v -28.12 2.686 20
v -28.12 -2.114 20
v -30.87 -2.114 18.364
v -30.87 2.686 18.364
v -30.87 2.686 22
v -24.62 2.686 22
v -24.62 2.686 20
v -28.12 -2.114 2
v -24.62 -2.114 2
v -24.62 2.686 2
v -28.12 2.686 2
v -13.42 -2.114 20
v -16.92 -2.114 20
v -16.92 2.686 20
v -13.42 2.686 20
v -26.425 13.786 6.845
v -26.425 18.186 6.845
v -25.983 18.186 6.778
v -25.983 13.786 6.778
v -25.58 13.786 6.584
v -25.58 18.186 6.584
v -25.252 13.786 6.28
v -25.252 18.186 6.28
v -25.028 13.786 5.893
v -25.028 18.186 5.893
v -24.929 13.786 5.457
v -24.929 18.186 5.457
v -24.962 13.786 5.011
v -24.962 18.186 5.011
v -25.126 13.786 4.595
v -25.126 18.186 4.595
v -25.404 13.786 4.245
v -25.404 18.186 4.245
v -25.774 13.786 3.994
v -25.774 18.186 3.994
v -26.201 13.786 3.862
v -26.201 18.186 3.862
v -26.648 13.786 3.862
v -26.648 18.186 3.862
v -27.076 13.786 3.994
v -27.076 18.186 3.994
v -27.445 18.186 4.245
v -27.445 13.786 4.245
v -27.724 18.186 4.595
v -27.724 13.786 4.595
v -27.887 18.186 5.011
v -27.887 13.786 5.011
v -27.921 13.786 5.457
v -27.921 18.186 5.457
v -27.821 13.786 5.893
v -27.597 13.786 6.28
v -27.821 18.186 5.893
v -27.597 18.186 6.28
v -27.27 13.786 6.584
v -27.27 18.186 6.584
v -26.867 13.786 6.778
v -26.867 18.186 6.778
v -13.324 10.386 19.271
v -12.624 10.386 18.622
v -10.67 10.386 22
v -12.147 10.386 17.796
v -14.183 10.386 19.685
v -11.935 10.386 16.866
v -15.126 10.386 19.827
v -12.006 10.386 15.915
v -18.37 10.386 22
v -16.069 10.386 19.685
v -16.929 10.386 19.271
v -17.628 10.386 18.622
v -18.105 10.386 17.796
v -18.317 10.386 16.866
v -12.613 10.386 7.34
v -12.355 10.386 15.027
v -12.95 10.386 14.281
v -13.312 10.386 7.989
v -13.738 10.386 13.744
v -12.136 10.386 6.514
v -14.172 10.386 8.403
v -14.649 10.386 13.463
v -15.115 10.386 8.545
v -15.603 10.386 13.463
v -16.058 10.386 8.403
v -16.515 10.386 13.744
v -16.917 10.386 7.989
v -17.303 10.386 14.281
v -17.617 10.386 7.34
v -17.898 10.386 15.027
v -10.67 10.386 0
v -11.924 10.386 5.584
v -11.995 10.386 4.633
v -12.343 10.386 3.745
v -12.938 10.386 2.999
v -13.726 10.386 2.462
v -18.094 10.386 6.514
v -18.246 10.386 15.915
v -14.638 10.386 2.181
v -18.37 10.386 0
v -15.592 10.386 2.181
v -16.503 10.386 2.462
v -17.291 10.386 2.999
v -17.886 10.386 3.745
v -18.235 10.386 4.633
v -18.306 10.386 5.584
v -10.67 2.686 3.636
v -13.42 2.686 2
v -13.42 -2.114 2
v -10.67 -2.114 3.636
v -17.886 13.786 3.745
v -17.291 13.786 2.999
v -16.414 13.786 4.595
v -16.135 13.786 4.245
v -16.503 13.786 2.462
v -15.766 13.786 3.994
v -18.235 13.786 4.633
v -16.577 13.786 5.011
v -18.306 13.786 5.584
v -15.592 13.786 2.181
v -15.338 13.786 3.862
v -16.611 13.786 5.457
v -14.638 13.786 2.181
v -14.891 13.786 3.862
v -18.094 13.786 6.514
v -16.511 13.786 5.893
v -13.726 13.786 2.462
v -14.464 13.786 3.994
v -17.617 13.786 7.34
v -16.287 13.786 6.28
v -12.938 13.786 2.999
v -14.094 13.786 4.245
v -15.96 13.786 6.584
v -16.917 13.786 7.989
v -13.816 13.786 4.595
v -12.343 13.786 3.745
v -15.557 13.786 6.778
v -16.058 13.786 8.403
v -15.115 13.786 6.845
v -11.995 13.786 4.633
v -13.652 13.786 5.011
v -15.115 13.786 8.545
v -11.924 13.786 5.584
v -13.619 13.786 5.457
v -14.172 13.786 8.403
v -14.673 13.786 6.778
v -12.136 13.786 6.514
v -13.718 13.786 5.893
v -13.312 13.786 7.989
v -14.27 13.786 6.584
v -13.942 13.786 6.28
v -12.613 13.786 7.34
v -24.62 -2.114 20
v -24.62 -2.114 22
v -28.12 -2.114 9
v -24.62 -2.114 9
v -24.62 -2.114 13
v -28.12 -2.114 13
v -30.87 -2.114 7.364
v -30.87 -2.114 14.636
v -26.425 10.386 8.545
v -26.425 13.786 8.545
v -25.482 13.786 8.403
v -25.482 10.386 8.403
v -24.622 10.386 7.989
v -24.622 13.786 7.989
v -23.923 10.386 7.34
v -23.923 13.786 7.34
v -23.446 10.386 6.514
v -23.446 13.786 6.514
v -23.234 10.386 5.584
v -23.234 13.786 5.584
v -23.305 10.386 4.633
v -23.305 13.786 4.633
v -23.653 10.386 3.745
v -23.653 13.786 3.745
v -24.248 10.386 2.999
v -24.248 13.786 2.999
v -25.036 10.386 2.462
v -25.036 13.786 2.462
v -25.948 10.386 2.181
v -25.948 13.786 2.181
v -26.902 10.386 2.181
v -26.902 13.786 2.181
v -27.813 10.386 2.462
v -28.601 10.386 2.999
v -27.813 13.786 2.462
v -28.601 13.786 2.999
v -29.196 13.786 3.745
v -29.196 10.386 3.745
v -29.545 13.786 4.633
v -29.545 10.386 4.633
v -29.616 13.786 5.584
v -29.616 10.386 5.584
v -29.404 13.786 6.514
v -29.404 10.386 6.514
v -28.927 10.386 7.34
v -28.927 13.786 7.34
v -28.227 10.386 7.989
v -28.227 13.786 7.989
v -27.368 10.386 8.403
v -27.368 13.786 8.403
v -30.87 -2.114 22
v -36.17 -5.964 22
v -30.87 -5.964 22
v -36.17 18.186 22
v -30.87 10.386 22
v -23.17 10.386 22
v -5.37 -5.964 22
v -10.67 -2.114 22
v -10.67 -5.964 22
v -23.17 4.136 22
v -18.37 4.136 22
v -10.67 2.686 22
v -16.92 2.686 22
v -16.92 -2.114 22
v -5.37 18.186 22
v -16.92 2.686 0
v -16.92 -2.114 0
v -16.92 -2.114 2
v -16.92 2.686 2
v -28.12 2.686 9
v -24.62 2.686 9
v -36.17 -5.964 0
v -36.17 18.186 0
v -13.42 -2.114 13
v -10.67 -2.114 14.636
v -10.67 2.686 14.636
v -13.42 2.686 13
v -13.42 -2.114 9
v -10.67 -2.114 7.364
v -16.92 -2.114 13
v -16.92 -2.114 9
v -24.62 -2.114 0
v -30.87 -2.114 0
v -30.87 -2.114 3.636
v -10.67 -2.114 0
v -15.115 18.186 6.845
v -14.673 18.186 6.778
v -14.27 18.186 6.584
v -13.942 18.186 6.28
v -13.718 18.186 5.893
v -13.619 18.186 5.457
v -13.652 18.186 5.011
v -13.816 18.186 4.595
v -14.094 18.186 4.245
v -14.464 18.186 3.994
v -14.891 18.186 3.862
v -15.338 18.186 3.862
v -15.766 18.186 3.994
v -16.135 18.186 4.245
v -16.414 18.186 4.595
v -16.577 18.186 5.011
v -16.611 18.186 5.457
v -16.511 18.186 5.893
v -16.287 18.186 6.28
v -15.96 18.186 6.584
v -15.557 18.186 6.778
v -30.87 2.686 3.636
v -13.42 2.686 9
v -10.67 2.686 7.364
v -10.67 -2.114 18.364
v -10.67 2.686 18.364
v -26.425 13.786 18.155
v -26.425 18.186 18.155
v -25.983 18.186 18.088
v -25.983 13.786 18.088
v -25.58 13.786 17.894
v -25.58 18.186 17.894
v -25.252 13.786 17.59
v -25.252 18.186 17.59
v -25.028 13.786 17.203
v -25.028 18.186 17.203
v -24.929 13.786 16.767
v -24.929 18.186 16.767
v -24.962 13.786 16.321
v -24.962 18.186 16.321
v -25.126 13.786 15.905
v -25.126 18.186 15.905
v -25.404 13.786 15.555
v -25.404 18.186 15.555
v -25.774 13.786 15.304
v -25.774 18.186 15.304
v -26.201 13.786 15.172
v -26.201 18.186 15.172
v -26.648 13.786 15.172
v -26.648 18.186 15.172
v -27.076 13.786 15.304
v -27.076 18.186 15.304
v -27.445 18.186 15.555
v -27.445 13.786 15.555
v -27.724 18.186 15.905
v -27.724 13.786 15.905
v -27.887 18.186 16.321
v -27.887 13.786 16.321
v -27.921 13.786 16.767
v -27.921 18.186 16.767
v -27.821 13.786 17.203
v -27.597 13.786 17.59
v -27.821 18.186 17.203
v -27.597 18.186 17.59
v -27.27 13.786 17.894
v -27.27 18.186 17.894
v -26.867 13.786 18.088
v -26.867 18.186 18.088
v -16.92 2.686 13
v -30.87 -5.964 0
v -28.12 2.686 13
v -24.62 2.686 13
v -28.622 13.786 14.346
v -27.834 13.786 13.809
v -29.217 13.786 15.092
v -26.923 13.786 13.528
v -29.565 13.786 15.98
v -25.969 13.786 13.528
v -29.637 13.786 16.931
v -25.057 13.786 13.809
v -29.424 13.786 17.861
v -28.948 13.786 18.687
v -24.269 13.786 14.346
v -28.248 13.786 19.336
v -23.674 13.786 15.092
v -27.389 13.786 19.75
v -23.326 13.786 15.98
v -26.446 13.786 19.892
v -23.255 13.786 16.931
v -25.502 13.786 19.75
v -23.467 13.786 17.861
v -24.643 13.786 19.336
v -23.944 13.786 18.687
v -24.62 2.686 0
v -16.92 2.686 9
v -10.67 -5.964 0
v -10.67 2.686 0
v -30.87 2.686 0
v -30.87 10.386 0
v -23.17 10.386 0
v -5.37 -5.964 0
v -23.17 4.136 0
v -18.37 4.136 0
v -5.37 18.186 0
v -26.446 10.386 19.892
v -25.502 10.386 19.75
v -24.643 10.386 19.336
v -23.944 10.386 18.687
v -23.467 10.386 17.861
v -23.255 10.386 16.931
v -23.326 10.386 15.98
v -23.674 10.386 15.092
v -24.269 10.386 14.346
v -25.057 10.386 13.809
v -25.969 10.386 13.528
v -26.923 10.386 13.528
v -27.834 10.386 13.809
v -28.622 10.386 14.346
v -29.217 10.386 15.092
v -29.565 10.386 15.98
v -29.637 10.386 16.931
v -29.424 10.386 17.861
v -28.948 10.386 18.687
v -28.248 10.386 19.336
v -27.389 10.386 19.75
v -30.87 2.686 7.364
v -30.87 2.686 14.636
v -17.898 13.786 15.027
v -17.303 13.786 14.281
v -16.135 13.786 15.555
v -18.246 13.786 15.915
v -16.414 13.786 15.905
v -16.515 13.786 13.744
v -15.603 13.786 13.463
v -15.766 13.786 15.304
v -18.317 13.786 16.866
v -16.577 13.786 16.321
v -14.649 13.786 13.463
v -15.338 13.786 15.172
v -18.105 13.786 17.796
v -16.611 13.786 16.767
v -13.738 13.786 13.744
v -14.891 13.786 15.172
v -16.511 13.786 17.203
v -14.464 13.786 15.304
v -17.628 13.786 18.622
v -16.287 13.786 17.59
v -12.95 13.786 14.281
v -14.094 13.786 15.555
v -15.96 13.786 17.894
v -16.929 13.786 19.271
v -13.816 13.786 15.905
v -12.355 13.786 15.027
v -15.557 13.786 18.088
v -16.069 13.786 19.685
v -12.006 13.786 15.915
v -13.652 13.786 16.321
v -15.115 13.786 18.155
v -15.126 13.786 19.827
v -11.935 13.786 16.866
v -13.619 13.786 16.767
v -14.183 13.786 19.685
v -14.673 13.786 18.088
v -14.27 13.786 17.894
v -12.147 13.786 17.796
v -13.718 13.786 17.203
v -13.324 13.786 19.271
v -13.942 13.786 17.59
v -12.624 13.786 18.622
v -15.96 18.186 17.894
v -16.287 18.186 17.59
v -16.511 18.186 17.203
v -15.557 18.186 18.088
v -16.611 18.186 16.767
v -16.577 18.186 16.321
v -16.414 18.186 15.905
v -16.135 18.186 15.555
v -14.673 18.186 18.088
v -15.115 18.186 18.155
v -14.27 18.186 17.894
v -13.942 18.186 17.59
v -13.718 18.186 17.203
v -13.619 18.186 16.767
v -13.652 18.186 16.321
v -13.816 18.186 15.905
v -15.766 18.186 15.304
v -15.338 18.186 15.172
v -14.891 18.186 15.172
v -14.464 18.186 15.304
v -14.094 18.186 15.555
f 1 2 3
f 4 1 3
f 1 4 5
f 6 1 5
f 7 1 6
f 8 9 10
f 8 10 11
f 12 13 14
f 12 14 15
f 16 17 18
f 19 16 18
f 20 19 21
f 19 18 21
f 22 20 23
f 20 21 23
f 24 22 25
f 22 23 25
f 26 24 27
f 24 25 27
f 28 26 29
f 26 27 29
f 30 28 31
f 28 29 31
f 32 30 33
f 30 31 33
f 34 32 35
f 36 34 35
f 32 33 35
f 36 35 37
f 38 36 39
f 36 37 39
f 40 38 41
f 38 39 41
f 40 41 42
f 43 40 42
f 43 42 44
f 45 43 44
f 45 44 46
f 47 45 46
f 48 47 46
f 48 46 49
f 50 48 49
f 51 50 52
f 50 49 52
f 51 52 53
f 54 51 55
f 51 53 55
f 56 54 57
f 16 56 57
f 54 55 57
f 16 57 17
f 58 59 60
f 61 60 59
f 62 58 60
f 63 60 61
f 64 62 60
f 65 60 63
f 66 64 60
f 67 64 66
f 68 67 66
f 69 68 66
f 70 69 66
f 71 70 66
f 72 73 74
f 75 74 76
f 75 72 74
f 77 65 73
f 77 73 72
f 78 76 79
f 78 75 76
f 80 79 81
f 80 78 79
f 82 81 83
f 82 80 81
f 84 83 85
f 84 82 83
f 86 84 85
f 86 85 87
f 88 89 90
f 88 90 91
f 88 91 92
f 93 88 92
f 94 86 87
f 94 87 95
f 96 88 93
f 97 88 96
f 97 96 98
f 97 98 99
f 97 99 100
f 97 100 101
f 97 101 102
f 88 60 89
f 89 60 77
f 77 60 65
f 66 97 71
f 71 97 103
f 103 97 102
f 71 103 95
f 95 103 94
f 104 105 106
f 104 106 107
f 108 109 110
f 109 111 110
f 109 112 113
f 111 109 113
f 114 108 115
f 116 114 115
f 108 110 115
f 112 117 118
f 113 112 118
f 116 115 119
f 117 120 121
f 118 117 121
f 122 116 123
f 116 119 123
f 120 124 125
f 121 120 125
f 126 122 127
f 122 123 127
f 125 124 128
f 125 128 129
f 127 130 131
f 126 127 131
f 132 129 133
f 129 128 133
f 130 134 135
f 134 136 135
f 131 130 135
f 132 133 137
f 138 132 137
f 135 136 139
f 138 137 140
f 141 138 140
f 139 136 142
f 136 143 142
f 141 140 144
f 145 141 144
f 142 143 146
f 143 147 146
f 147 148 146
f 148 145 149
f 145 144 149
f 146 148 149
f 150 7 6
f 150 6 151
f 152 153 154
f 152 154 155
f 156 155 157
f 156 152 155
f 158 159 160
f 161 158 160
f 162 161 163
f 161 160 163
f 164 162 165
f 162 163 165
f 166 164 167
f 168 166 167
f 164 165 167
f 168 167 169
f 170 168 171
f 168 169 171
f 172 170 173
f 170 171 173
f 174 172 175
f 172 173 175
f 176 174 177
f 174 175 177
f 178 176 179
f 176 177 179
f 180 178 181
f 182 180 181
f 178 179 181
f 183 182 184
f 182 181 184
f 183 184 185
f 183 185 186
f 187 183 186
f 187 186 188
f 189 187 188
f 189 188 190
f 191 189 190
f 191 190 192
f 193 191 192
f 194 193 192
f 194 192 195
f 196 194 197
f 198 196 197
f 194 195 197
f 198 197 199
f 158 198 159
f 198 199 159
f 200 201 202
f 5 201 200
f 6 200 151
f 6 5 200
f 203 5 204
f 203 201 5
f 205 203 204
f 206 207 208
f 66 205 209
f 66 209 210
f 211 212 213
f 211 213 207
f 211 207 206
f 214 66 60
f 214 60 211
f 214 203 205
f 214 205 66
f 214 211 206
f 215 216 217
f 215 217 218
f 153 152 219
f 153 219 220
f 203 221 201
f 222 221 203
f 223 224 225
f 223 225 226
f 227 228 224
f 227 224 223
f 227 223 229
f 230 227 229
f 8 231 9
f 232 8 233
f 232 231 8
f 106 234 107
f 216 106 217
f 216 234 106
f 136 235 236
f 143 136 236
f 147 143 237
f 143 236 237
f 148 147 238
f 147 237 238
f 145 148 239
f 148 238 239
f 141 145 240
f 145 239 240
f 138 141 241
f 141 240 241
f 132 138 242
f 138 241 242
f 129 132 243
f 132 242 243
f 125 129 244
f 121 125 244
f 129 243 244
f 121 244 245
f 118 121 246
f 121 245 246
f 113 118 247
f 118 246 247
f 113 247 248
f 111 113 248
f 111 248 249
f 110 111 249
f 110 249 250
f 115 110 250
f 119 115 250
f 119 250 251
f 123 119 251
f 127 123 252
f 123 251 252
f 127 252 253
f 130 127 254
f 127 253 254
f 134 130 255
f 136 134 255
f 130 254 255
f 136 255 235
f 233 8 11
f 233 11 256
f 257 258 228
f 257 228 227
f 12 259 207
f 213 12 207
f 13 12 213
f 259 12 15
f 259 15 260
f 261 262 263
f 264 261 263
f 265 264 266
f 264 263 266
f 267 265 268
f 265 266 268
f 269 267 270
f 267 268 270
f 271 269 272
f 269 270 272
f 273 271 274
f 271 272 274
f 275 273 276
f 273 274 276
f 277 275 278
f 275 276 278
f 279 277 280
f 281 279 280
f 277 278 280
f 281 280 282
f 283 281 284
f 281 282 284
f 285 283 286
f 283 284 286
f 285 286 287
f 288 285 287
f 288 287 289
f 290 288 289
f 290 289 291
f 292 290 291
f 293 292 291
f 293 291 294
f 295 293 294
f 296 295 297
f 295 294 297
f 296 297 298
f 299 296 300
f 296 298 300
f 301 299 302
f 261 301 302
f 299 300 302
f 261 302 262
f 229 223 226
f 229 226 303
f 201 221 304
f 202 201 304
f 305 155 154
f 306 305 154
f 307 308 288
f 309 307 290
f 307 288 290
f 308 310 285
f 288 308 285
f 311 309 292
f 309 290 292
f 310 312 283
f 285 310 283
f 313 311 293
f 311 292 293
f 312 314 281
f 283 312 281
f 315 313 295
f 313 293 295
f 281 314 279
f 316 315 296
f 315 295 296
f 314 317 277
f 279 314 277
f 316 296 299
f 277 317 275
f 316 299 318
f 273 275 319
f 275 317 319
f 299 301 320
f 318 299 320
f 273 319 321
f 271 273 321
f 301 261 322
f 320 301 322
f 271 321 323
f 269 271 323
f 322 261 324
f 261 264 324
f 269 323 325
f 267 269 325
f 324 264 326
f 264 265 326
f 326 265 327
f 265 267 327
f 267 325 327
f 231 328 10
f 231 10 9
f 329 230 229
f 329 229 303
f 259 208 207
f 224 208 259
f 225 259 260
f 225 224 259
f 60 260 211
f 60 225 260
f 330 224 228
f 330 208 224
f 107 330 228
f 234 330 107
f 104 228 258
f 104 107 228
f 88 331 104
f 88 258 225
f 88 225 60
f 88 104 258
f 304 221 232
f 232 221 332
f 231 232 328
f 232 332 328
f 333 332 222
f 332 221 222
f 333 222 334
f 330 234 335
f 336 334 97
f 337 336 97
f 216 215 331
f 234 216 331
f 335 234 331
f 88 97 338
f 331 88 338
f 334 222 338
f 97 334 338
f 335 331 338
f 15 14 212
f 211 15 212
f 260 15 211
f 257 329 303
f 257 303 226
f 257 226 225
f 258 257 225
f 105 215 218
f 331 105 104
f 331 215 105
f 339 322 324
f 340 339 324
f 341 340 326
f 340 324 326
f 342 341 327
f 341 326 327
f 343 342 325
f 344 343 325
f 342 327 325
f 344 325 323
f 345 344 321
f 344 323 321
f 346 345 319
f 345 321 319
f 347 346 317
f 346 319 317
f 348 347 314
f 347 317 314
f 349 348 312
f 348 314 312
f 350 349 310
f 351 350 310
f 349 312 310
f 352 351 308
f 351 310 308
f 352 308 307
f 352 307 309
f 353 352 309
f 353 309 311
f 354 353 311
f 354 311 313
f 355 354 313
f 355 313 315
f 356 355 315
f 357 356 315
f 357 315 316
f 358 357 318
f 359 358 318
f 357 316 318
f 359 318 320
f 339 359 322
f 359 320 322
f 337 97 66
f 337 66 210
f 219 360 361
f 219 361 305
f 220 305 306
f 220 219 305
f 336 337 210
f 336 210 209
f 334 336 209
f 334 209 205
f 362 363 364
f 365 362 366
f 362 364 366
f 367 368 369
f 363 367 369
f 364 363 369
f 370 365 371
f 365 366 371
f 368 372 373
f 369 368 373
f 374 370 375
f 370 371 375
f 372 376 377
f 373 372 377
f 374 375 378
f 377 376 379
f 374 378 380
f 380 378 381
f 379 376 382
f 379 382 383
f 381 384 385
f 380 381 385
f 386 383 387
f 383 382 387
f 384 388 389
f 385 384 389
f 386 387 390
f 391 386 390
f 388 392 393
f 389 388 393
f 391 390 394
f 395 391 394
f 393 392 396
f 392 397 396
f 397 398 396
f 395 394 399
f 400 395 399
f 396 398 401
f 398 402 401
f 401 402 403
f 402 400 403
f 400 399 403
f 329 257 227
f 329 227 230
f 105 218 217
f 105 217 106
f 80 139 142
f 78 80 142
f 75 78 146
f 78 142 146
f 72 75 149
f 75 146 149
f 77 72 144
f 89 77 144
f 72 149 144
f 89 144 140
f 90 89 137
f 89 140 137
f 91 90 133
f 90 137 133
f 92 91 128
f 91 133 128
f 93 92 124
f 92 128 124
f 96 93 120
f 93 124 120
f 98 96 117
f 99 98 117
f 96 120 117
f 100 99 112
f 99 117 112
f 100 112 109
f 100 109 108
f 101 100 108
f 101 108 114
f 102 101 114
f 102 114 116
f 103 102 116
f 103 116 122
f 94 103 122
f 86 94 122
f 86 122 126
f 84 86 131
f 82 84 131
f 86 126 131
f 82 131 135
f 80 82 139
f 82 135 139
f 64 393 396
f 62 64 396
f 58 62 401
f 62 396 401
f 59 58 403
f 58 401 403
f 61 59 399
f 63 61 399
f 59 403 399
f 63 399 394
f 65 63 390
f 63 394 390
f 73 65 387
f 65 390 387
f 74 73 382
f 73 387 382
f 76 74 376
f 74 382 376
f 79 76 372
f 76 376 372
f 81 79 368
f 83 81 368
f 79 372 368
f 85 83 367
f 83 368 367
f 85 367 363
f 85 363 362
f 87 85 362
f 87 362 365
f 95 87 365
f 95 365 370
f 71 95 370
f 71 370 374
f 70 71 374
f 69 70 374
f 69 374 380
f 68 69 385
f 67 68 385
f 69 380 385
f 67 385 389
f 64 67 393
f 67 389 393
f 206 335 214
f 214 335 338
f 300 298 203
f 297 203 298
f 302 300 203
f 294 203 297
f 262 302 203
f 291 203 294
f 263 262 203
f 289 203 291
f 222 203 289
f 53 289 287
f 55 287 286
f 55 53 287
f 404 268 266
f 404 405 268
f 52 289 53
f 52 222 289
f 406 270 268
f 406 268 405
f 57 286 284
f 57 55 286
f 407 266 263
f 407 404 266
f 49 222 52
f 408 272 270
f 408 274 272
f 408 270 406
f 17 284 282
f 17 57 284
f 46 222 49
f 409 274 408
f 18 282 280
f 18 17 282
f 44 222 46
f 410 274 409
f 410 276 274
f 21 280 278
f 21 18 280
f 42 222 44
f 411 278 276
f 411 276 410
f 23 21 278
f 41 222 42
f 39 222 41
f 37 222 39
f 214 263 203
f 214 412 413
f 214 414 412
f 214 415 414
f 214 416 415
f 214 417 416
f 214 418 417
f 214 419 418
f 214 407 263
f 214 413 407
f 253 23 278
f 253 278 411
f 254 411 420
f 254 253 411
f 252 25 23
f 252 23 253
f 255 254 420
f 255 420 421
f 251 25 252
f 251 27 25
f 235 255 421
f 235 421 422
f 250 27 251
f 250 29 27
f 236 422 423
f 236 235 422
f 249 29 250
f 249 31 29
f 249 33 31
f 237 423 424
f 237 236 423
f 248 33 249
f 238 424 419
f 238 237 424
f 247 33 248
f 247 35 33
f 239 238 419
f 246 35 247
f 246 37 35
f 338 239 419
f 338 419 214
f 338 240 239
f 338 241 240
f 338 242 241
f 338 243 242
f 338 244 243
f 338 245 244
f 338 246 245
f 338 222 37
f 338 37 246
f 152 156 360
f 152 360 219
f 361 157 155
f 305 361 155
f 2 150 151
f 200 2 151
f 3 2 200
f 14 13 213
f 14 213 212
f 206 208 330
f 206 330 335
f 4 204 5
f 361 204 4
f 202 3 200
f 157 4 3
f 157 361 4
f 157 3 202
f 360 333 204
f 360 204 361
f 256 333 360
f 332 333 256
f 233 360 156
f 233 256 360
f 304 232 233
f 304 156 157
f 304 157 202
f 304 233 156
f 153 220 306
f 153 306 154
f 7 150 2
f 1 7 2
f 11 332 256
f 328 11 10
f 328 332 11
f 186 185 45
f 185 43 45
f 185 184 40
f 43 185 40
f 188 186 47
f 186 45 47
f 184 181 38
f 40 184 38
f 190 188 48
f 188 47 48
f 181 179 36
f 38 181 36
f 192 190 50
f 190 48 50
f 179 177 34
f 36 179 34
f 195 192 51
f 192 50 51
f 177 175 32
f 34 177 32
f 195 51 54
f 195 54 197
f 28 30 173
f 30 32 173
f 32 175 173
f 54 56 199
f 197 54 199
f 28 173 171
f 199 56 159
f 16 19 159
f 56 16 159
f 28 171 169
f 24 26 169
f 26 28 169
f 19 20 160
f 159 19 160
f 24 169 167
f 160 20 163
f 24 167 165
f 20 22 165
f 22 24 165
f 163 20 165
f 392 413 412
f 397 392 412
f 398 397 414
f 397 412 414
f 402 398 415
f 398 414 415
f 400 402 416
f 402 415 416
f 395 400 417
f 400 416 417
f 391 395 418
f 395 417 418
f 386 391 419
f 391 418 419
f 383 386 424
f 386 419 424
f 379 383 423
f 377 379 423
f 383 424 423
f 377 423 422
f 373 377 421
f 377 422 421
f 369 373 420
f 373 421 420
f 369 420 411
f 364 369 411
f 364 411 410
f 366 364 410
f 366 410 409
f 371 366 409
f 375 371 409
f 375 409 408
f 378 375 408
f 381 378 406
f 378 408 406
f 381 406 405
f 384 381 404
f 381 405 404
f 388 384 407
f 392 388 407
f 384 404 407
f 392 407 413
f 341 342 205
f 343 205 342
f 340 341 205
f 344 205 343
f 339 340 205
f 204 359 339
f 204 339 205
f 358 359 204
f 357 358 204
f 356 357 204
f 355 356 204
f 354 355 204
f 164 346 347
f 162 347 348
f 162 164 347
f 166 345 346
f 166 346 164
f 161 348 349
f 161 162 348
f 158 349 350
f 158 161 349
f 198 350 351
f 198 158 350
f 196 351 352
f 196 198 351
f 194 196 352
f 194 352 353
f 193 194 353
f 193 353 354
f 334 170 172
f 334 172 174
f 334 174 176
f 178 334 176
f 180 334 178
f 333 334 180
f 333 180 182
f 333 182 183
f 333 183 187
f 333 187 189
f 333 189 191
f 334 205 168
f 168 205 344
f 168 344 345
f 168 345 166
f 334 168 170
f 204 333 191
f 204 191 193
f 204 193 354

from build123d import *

# Parameters (mm, degrees)
ESQUISSE1_W                   = 30.8
ESQUISSE1_H                   = 24.15
BOSS_EXTRU_1_DEPTH            = 22
ENL_V_START                   = -22
ENL_V_MAT_EXTRU_2_DEPTH       = 22
ESQUISSE3_R                   = 1.5
ENL_V_MAT_EXTRU_3_DEPTH       = 4.4
ESQUISSE6_R                   = 3.2
ENL_V_MAT_EXTRU_6_DEPTH       = 3.4
ESQUISSE7_R                   = 3.2
ENL_V_MAT_EXTRU_7_DEPTH       = 3.4
ESQUISSE10_R                  = 3.2
ENL_V_MAT_EXTRU_10_DEPTH      = 3.4
ESQUISSE11_R                  = 3.2
ENL_V_MAT_EXTRU_11_DEPTH      = 3.4
ENL_V_MAT_EXTRU_14_DEPTH      = 47.950397903
ENL_V_MAT_EXTRU_14_DEPTH_BACK = 4.8
ENL_V_MAT_EXTRU_19_DEPTH      = 4.8
ENL_V_MAT_EXTRU_20_DEPTH      = 4.8
ENL_V_MAT_EXTRU_21_DEPTH      = 4.8


# Read off the part's stored shape, not the designer's step: Enlèv. mat.-Extru.2
with BuildPart() as part:
    # Esquisse1 → Boss.-Extru.1 (new body)
    with BuildSketch(Plane.XY):
        with Locations((-20.769736842, 6.111184211)):
            Rectangle(ESQUISSE1_W, ESQUISSE1_H)
    extrude(amount=BOSS_EXTRU_1_DEPTH)

    # Enlèv. mat.-Extru.2 outline → Enlèv. mat.-Extru.2 (cut)
    with BuildSketch(Plane.XY.offset(22).offset(ENL_V_START)):
        Polygon((-30.869736842, -5.963815789), (-10.669736842, -5.963815789), (-10.669736842, -2.113815789), (-16.919736842, -2.113815789), (-16.919736842, 2.686184211), (-10.669736842, 2.686184211), (-10.669736842, 10.386184211), (-18.369736842, 10.386184211), (-18.369736842, 4.136184211), (-23.169736842, 4.136184211), (-23.169736842, 10.386184211), (-30.869736842, 10.386184211), (-30.869736842, 2.686184211), (-24.619736842, 2.686184211), (-24.619736842, -2.113815789), (-30.869736842, -2.113815789), align=None)
    extrude(amount=ENL_V_MAT_EXTRU_2_DEPTH, mode=Mode.SUBTRACT)

    # Esquisse3 → Enlèv. mat.-Extru.3 (cut)
    with BuildSketch(Plane(origin=(0, 18.186184211, 0), x_dir=(1, 0, 0), z_dir=(0, 1, 0))):
        with Locations(Location((-26.424736842, -5.345, 0), (0, 0, 270))):
            Circle(ESQUISSE3_R)
        with Locations(Location((-15.114736842, -5.345, 0), (0, 0, 270))):
            Circle(ESQUISSE3_R)
        with Locations(Location((-26.424736842, -16.655, 0), (0, 0, 270))):
            Circle(ESQUISSE3_R)
        with Locations(Location((-15.114736842, -16.655, 0), (0, 0, 270))):
            Circle(ESQUISSE3_R)
    extrude(amount=-ENL_V_MAT_EXTRU_3_DEPTH, mode=Mode.SUBTRACT)

    # Esquisse6 → Enlèv. mat.-Extru.6 (cut)
    with BuildSketch(Plane(origin=(0, 13.786184211, 0), x_dir=(1, 0, 0), z_dir=(0, 1, 0))):
        with Locations(Location((-15.126255276, -16.627264665, 0), (0, 0, 270))):
            Circle(ESQUISSE6_R)
    extrude(amount=-ENL_V_MAT_EXTRU_6_DEPTH, mode=Mode.SUBTRACT)

    # Esquisse7 → Enlèv. mat.-Extru.7 (cut)
    with BuildSketch(Plane(origin=(0, 13.786184211, 0), x_dir=(1, 0, 0), z_dir=(0, 1, 0))):
        with Locations(Location((-26.44565221, -16.692132269, 0), (0, 0, 270))):
            Circle(ESQUISSE7_R)
    extrude(amount=-ENL_V_MAT_EXTRU_7_DEPTH, mode=Mode.SUBTRACT)

    # Esquisse10 → Enlèv. mat.-Extru.10 (cut)
    with BuildSketch(Plane(origin=(0, 13.786184211, 0), x_dir=(1, 0, 0), z_dir=(0, 1, 0))):
        with Locations(Location((-15.114736842, -5.345, 0), (0, 0, 270))):
            Circle(ESQUISSE10_R)
    extrude(amount=-ENL_V_MAT_EXTRU_10_DEPTH, mode=Mode.SUBTRACT)

    # Esquisse11 → Enlèv. mat.-Extru.11 (cut)
    with BuildSketch(Plane(origin=(0, 13.786184211, 0), x_dir=(1, 0, 0), z_dir=(0, 1, 0))):
        with Locations(Location((-26.424736842, -5.345, 0), (0, 0, 270))):
            Circle(ESQUISSE11_R)
    extrude(amount=-ENL_V_MAT_EXTRU_11_DEPTH, mode=Mode.SUBTRACT)

    # Esquisse12 → Enlèv. mat.-Extru.14 (cut, two sides: drawn at the far end of the back side and taken through both)
    with BuildSketch(Plane(origin=(0, -2.113815789, 0), x_dir=(-1, 0, 0), z_dir=(0, -1, 0)).offset(-ENL_V_MAT_EXTRU_14_DEPTH_BACK)):
        Polygon((16.919736842, -9), (16.919736842, -2), (13.419736842, -2), (10.669736842, -3.636306817), (10.669736842, -7.363693183), (13.419736842, -9), align=None)
    extrude(amount=ENL_V_MAT_EXTRU_14_DEPTH + ENL_V_MAT_EXTRU_14_DEPTH_BACK, mode=Mode.SUBTRACT)

    # Esquisse13 → Enlèv. mat.-Extru.19 (cut)
    with BuildSketch(Plane(origin=(0, -2.113815789, 0), x_dir=(-1, 0, 0), z_dir=(0, -1, 0))):
        Polygon((24.619736842, -2), (28.119736842, -2), (30.869736842, -3.636306817), (30.869736842, -7.363693183), (28.119736842, -9), (24.619736842, -9), align=None)
    extrude(amount=-ENL_V_MAT_EXTRU_19_DEPTH, mode=Mode.SUBTRACT)

    # Esquisse14 → Enlèv. mat.-Extru.20 (cut)
    with BuildSketch(Plane(origin=(0, -2.113815789, 0), x_dir=(-1, 0, 0), z_dir=(0, -1, 0))):
        Polygon((24.619736842, -20), (28.119736842, -20), (30.869736842, -18.363693183), (30.869736842, -14.636306817), (28.119736842, -13), (24.619736842, -13), align=None)
    extrude(amount=-ENL_V_MAT_EXTRU_20_DEPTH, mode=Mode.SUBTRACT)

    # Esquisse16 → Enlèv. mat.-Extru.21 (cut)
    with BuildSketch(Plane(origin=(0, -2.113815789, 0), x_dir=(-1, 0, 0), z_dir=(0, -1, 0))):
        Polygon((16.919736842, -20), (13.419736842, -20), (10.669736842, -18.363693183), (10.669736842, -14.636306817), (13.419736842, -13), (16.919736842, -13), align=None)
    extrude(amount=-ENL_V_MAT_EXTRU_21_DEPTH, mode=Mode.SUBTRACT)


solid = part.part
